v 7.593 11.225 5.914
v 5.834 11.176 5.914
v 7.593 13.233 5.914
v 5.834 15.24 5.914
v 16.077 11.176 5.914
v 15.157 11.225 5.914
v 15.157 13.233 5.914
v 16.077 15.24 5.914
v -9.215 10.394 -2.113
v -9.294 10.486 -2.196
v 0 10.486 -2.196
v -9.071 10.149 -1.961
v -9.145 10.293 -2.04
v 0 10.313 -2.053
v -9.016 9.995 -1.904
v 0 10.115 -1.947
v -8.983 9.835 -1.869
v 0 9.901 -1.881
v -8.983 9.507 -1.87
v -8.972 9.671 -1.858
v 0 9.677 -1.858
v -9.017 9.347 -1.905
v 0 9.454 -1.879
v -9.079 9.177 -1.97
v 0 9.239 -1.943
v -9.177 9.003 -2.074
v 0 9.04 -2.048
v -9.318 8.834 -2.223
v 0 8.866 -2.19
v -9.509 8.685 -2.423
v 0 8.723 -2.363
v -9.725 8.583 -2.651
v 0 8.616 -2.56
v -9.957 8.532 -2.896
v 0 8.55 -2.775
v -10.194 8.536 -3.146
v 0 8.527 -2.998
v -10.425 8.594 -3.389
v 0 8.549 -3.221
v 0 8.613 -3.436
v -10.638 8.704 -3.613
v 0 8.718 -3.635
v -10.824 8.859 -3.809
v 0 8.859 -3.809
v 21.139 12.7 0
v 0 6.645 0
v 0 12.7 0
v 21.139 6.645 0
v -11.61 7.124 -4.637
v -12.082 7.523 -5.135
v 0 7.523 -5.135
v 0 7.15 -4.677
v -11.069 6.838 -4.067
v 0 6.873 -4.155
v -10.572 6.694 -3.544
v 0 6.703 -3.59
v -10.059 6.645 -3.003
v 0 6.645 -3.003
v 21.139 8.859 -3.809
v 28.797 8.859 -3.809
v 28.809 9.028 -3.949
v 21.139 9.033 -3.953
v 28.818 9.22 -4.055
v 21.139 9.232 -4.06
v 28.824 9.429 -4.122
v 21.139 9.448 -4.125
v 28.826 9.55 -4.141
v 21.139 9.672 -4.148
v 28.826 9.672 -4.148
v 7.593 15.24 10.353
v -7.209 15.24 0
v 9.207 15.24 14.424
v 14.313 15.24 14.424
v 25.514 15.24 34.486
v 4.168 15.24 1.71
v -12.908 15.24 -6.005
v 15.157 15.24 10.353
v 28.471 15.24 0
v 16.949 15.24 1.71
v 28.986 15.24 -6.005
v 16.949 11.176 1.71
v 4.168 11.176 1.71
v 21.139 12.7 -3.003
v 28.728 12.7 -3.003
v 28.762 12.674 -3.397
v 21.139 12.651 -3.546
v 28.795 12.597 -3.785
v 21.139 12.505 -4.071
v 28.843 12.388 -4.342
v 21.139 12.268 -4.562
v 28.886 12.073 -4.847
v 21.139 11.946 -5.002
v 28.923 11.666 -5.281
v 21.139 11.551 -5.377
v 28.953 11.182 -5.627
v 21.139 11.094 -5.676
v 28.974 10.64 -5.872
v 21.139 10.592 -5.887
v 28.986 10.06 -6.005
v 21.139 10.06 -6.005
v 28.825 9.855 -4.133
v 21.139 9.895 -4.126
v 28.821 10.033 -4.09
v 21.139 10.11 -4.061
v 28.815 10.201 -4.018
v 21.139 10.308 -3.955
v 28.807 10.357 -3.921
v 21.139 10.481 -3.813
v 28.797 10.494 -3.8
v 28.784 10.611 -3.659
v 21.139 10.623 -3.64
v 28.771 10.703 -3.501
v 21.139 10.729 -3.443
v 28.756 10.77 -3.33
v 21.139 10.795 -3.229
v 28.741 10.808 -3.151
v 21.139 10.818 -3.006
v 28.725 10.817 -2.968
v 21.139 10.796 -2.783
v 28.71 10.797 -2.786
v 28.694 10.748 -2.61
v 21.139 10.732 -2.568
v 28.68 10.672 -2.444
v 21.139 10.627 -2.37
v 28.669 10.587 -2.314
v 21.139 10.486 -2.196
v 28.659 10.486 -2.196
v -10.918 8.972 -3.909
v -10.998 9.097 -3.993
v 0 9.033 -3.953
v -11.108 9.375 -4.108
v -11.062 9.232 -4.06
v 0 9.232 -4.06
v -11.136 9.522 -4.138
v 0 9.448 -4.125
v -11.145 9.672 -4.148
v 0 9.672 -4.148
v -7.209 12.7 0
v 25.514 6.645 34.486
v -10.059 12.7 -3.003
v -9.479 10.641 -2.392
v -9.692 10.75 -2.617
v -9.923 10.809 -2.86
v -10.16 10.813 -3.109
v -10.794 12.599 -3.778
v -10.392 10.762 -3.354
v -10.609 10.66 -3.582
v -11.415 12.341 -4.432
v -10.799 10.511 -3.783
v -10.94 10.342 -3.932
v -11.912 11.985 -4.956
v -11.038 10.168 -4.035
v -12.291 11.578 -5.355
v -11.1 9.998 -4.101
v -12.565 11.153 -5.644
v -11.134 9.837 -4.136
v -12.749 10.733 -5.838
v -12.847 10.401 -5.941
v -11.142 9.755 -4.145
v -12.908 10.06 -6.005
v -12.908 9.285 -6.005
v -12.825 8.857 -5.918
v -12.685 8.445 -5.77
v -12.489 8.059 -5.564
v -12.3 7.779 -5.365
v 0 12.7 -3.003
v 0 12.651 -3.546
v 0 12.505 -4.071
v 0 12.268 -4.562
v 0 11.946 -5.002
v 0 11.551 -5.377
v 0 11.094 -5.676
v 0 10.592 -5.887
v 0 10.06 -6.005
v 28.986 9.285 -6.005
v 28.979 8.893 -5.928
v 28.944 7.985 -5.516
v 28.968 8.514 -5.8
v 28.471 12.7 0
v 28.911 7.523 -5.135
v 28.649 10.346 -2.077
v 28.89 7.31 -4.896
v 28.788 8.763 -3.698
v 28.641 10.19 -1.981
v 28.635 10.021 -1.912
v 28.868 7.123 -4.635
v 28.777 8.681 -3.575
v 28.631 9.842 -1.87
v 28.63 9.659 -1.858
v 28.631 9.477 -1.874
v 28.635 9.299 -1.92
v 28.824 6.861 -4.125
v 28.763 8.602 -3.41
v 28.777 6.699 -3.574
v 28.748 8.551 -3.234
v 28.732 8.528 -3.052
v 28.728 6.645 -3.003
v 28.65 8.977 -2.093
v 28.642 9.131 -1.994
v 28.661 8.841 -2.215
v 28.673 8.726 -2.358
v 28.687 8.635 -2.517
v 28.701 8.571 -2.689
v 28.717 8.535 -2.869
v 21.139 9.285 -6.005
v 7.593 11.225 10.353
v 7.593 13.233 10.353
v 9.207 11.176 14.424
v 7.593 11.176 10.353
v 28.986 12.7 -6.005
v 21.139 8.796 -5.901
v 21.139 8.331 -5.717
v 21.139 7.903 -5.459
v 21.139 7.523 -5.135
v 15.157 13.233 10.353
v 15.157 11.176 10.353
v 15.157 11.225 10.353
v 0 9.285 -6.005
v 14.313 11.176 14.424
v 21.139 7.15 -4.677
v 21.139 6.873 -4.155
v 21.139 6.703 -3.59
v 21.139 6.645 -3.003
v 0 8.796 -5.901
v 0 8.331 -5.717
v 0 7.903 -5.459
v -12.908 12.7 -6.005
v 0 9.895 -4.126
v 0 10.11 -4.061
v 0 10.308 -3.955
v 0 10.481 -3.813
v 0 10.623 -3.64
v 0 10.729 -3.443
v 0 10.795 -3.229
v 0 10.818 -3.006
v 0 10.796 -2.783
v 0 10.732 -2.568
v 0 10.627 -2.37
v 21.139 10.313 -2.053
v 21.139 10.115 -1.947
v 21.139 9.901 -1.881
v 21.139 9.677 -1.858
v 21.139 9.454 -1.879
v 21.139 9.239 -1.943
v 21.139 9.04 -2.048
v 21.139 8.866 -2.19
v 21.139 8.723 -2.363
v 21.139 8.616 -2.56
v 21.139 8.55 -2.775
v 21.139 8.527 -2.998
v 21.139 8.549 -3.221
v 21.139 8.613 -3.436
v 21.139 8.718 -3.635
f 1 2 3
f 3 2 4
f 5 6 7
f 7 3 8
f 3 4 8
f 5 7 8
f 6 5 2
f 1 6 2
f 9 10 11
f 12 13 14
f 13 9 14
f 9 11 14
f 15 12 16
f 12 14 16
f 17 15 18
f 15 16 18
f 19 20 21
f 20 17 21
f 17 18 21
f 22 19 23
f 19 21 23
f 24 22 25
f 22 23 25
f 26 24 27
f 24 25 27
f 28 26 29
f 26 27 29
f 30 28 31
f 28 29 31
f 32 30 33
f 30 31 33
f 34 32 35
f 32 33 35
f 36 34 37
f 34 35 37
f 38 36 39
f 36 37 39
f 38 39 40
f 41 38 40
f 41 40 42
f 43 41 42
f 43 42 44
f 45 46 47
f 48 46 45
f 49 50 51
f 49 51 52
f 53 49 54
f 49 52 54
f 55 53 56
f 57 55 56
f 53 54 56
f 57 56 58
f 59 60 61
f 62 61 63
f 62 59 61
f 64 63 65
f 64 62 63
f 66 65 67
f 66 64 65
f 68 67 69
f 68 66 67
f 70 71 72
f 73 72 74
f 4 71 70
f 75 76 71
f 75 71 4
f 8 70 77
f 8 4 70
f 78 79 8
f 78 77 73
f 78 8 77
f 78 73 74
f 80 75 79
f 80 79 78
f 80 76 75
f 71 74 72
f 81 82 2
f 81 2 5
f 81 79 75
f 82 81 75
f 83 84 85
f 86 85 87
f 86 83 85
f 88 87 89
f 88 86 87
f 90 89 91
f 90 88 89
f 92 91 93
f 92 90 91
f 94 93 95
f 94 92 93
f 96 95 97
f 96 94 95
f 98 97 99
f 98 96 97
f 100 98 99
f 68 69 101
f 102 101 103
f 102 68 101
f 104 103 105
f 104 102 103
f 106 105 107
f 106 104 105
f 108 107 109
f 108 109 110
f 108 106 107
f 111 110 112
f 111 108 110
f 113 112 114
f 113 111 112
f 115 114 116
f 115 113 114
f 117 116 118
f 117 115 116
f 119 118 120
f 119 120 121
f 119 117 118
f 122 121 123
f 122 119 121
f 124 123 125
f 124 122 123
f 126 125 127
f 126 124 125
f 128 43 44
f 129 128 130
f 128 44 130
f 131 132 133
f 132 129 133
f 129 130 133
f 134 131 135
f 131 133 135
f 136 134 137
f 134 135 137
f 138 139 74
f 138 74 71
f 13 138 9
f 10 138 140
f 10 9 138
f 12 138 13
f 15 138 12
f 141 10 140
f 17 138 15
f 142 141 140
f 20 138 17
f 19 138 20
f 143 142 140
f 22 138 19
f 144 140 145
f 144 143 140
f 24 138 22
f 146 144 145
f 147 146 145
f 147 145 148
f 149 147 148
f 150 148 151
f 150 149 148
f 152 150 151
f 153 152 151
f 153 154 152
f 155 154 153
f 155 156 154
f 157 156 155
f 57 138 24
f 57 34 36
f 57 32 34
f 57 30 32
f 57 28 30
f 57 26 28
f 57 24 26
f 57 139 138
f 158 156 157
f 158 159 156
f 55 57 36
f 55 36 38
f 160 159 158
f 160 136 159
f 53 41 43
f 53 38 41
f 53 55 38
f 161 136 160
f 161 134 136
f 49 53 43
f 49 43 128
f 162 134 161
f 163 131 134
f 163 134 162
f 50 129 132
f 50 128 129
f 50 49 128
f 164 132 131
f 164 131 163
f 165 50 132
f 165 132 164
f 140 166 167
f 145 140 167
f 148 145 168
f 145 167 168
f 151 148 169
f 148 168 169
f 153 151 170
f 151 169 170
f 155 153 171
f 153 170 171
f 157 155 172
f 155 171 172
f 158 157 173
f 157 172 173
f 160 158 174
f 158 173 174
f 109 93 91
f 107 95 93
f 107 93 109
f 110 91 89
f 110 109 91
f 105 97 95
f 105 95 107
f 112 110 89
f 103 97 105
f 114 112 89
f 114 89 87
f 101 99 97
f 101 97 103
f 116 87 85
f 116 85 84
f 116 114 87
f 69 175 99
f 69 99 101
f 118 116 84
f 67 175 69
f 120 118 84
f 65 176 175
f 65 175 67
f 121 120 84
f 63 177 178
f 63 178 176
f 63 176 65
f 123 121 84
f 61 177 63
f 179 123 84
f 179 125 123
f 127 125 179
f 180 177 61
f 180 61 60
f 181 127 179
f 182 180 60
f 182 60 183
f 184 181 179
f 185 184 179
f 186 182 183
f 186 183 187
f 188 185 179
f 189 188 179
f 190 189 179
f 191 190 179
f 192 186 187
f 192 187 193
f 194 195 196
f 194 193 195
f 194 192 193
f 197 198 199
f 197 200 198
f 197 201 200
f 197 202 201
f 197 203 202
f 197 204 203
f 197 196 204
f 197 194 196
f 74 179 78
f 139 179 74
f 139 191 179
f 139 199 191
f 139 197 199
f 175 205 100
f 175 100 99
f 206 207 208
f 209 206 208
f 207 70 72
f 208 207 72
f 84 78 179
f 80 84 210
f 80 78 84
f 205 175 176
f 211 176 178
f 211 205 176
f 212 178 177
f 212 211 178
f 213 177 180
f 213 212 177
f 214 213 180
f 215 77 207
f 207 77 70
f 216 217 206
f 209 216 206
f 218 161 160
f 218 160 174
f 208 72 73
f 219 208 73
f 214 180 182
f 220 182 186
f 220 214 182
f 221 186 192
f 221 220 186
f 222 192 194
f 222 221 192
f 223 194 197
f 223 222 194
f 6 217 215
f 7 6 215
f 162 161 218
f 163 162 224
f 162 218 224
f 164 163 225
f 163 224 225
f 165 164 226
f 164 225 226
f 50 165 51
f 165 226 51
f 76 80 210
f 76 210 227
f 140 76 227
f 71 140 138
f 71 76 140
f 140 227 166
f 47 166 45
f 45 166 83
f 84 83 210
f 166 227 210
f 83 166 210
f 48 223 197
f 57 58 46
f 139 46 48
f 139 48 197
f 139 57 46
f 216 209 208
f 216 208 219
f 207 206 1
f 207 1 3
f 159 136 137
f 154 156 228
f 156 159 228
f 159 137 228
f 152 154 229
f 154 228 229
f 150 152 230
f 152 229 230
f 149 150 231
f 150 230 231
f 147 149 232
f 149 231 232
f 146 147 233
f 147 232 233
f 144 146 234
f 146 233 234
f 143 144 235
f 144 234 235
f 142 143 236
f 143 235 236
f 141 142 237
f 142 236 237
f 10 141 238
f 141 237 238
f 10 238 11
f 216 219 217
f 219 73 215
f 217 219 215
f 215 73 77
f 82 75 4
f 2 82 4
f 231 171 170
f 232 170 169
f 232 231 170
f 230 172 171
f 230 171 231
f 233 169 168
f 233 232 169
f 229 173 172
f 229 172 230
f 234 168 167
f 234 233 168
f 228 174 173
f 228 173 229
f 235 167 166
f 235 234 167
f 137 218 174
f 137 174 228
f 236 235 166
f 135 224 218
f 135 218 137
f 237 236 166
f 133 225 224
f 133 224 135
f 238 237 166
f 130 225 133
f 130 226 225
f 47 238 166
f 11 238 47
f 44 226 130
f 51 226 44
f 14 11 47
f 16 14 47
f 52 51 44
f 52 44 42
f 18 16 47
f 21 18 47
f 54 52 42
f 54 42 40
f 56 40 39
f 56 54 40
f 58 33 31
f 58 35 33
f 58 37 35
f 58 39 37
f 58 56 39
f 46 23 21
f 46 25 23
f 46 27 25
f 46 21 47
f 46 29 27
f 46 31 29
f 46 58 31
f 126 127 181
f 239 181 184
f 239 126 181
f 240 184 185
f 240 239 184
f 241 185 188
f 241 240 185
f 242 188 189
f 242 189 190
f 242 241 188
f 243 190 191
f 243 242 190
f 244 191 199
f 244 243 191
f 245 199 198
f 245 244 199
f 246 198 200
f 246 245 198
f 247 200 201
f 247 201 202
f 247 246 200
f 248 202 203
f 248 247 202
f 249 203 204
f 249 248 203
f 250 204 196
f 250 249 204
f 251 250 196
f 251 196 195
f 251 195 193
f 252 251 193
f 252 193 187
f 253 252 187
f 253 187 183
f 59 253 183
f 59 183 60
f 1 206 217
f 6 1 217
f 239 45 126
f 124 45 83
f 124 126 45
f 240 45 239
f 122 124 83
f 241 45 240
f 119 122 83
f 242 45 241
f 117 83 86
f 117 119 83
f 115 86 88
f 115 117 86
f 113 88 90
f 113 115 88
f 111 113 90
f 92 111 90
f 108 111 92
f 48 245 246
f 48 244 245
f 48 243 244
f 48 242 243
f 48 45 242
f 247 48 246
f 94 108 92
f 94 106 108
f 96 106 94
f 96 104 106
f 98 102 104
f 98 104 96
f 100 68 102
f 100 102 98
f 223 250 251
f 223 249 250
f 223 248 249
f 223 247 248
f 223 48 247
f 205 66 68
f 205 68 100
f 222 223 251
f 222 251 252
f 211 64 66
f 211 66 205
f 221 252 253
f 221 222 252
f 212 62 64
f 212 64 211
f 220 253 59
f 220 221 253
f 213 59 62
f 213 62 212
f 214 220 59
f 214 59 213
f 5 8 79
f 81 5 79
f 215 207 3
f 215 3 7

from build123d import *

# Parameters (mm, degrees)
BOSS_EXTRUDE1_DEPTH     = 15.24
CUT_EXTRUDE1_DEPTH      = 2.54
SKETCH3_W               = 34.486175175
SKETCH3_H               = 6.644984791
CUT_EXTRUDE2_DEPTH      = 34.544
CUT_EXTRUDE2_DEPTH_BACK = 19.812
CUT_EXTRUDE3_DEPTH      = 4.064
SKETCH5_W               = 7.563523275
SKETCH5_H               = 2.007464402
CUT_EXTRUDE4_DEPTH      = 6.604
BOSS_EXTRUDE2_DEPTH     = 2.54


with BuildPart() as part:
    # Sketch1 → Boss-Extrude1 (new body)
    with BuildSketch(Plane(origin=(0, 0, 0), x_dir=(1, 0, 0), z_dir=(0, 1, 0))):
        Polygon((0, 0), (21.138647769, 0), (21.138647769, 6.005297662), (28.985570047, 6.005297662), (25.514226291, -34.486175175), (-12.907838022, 6.005297662), (0, 6.005297662), align=None)
    extrude(amount=BOSS_EXTRUDE1_DEPTH)

    # Sketch2 → Cut-Extrude1 (cut)
    with BuildSketch(Plane(origin=(0, 15.24, 0), x_dir=(1, 0, 0), z_dir=(0, 1, 0))):
        Polygon((21.138647769, 0), (28.470734427, 0), (28.985570047, 6.005297662), (21.138647769, 6.005297662), align=None)
        Polygon((0, 0), (-7.209454713, 0), (-12.907838022, 6.005297662), (0, 6.005297662), align=None)
    extrude(amount=-CUT_EXTRUDE1_DEPTH, mode=Mode.SUBTRACT)

    # Sketch3 → Cut-Extrude2 (cut, two sides)
    with BuildSketch(Plane(origin=(0, 0, 0), x_dir=(0, 0, -1), z_dir=(1, 0, 0))) as cut_extrude2_sk:
        with BuildLine():
            Line((6.005297662, 12.7), (3.002648831, 12.7))
            ThreePointArc((3.002648831, 12.7), (5.001853121, 11.946032476), (6.005297662, 10.05966457))
            Line((6.005297662, 10.05966457), (6.005297662, 12.7))
        make_face()
        with BuildLine():
            ThreePointArc((4.147717946, 9.672492396), (3.443027426, 10.729492855), (2.196307404, 10.485509481))
            Line((2.196307404, 10.485509481), (3.808990258, 8.85947531))
            ThreePointArc((3.808990258, 8.85947531), (4.059649291, 9.2321138), (4.147717946, 9.672492396))
        make_face()
        with BuildLine():
            Line((3.808990258, 8.85947531), (2.196307404, 10.485509481))
            ThreePointArc((2.196307404, 10.485509481), (2.189631745, 8.866150969), (3.808990258, 8.85947531))
        make_face()
        with BuildLine():
            ThreePointArc((5.134576738, 7.522914369), (4.155458111, 6.873057978), (3.002648831, 6.644984791))
            Line((3.002648831, 6.644984791), (6.005297662, 6.644984791))
            Line((6.005297662, 6.644984791), (5.134576738, 7.522914369))
        make_face()
        with BuildLine():
            Line((6.005297662, 6.644984791), (6.005297662, 9.285320221))
            ThreePointArc((6.005297662, 9.285320221), (5.716960561, 8.331480044), (5.134576738, 7.522914369))
            Line((5.134576738, 7.522914369), (6.005297662, 6.644984791))
        make_face()
        Polygon((3.002648831, 6.644984791), (0, 6.644984791), (0, 0), (6.005297662, 0), (6.005297662, 6.644984791), align=None)
        with Locations((-17.243087587, 3.322492396)):
            Rectangle(SKETCH3_W, SKETCH3_H)
    extrude(amount=CUT_EXTRUDE2_DEPTH, mode=Mode.SUBTRACT)
    extrude(cut_extrude2_sk.sketch, amount=-CUT_EXTRUDE2_DEPTH_BACK, mode=Mode.SUBTRACT)

    # Sketch4 → Cut-Extrude3 (cut)
    with BuildSketch(Plane(origin=(0, 15.24, 0), x_dir=(1, 0, 0), z_dir=(0, 1, 0))):
        Polygon((10.569323885, -5.914326858), (10.569323885, -1.709556921), (4.167807975, -1.709556921), (5.834265352, -5.914326858), align=None)
        Polygon((16.948973736, -1.709556921), (10.569323885, -1.709556921), (10.569323885, -5.914326858), (16.077118552, -5.914326858), align=None)
        Polygon((10.569323885, -14.423980302), (10.569323885, -10.352695125), (7.593303694, -10.352695125), (9.206857662, -14.423980302), align=None)
        Polygon((15.156826969, -10.352695125), (10.569323885, -10.352695125), (10.569323885, -14.423980302), (14.312649728, -14.423980302), align=None)
    extrude(amount=-CUT_EXTRUDE3_DEPTH, mode=Mode.SUBTRACT)

    # Sketch5 → Cut-Extrude4 (cut)
    with BuildSketch(Plane.XY.offset(10.352695125)):
        with Locations((11.375065332, 12.228803396)):
            Rectangle(SKETCH5_W, SKETCH5_H)
    extrude(amount=-CUT_EXTRUDE4_DEPTH, mode=Mode.SUBTRACT)

    # Sketch6 → Boss-Extrude2 (add)
    with BuildSketch(Plane(origin=(0, 15.24, 0), x_dir=(1, 0, 0), z_dir=(0, 1, 0))):
        Polygon((28.470734427, 0), (28.985570047, 6.005297662), (-12.907838022, 6.005297662), (-7.209454713, 0), align=None)
    extrude(amount=-BOSS_EXTRUDE2_DEPTH)


solid = part.part
